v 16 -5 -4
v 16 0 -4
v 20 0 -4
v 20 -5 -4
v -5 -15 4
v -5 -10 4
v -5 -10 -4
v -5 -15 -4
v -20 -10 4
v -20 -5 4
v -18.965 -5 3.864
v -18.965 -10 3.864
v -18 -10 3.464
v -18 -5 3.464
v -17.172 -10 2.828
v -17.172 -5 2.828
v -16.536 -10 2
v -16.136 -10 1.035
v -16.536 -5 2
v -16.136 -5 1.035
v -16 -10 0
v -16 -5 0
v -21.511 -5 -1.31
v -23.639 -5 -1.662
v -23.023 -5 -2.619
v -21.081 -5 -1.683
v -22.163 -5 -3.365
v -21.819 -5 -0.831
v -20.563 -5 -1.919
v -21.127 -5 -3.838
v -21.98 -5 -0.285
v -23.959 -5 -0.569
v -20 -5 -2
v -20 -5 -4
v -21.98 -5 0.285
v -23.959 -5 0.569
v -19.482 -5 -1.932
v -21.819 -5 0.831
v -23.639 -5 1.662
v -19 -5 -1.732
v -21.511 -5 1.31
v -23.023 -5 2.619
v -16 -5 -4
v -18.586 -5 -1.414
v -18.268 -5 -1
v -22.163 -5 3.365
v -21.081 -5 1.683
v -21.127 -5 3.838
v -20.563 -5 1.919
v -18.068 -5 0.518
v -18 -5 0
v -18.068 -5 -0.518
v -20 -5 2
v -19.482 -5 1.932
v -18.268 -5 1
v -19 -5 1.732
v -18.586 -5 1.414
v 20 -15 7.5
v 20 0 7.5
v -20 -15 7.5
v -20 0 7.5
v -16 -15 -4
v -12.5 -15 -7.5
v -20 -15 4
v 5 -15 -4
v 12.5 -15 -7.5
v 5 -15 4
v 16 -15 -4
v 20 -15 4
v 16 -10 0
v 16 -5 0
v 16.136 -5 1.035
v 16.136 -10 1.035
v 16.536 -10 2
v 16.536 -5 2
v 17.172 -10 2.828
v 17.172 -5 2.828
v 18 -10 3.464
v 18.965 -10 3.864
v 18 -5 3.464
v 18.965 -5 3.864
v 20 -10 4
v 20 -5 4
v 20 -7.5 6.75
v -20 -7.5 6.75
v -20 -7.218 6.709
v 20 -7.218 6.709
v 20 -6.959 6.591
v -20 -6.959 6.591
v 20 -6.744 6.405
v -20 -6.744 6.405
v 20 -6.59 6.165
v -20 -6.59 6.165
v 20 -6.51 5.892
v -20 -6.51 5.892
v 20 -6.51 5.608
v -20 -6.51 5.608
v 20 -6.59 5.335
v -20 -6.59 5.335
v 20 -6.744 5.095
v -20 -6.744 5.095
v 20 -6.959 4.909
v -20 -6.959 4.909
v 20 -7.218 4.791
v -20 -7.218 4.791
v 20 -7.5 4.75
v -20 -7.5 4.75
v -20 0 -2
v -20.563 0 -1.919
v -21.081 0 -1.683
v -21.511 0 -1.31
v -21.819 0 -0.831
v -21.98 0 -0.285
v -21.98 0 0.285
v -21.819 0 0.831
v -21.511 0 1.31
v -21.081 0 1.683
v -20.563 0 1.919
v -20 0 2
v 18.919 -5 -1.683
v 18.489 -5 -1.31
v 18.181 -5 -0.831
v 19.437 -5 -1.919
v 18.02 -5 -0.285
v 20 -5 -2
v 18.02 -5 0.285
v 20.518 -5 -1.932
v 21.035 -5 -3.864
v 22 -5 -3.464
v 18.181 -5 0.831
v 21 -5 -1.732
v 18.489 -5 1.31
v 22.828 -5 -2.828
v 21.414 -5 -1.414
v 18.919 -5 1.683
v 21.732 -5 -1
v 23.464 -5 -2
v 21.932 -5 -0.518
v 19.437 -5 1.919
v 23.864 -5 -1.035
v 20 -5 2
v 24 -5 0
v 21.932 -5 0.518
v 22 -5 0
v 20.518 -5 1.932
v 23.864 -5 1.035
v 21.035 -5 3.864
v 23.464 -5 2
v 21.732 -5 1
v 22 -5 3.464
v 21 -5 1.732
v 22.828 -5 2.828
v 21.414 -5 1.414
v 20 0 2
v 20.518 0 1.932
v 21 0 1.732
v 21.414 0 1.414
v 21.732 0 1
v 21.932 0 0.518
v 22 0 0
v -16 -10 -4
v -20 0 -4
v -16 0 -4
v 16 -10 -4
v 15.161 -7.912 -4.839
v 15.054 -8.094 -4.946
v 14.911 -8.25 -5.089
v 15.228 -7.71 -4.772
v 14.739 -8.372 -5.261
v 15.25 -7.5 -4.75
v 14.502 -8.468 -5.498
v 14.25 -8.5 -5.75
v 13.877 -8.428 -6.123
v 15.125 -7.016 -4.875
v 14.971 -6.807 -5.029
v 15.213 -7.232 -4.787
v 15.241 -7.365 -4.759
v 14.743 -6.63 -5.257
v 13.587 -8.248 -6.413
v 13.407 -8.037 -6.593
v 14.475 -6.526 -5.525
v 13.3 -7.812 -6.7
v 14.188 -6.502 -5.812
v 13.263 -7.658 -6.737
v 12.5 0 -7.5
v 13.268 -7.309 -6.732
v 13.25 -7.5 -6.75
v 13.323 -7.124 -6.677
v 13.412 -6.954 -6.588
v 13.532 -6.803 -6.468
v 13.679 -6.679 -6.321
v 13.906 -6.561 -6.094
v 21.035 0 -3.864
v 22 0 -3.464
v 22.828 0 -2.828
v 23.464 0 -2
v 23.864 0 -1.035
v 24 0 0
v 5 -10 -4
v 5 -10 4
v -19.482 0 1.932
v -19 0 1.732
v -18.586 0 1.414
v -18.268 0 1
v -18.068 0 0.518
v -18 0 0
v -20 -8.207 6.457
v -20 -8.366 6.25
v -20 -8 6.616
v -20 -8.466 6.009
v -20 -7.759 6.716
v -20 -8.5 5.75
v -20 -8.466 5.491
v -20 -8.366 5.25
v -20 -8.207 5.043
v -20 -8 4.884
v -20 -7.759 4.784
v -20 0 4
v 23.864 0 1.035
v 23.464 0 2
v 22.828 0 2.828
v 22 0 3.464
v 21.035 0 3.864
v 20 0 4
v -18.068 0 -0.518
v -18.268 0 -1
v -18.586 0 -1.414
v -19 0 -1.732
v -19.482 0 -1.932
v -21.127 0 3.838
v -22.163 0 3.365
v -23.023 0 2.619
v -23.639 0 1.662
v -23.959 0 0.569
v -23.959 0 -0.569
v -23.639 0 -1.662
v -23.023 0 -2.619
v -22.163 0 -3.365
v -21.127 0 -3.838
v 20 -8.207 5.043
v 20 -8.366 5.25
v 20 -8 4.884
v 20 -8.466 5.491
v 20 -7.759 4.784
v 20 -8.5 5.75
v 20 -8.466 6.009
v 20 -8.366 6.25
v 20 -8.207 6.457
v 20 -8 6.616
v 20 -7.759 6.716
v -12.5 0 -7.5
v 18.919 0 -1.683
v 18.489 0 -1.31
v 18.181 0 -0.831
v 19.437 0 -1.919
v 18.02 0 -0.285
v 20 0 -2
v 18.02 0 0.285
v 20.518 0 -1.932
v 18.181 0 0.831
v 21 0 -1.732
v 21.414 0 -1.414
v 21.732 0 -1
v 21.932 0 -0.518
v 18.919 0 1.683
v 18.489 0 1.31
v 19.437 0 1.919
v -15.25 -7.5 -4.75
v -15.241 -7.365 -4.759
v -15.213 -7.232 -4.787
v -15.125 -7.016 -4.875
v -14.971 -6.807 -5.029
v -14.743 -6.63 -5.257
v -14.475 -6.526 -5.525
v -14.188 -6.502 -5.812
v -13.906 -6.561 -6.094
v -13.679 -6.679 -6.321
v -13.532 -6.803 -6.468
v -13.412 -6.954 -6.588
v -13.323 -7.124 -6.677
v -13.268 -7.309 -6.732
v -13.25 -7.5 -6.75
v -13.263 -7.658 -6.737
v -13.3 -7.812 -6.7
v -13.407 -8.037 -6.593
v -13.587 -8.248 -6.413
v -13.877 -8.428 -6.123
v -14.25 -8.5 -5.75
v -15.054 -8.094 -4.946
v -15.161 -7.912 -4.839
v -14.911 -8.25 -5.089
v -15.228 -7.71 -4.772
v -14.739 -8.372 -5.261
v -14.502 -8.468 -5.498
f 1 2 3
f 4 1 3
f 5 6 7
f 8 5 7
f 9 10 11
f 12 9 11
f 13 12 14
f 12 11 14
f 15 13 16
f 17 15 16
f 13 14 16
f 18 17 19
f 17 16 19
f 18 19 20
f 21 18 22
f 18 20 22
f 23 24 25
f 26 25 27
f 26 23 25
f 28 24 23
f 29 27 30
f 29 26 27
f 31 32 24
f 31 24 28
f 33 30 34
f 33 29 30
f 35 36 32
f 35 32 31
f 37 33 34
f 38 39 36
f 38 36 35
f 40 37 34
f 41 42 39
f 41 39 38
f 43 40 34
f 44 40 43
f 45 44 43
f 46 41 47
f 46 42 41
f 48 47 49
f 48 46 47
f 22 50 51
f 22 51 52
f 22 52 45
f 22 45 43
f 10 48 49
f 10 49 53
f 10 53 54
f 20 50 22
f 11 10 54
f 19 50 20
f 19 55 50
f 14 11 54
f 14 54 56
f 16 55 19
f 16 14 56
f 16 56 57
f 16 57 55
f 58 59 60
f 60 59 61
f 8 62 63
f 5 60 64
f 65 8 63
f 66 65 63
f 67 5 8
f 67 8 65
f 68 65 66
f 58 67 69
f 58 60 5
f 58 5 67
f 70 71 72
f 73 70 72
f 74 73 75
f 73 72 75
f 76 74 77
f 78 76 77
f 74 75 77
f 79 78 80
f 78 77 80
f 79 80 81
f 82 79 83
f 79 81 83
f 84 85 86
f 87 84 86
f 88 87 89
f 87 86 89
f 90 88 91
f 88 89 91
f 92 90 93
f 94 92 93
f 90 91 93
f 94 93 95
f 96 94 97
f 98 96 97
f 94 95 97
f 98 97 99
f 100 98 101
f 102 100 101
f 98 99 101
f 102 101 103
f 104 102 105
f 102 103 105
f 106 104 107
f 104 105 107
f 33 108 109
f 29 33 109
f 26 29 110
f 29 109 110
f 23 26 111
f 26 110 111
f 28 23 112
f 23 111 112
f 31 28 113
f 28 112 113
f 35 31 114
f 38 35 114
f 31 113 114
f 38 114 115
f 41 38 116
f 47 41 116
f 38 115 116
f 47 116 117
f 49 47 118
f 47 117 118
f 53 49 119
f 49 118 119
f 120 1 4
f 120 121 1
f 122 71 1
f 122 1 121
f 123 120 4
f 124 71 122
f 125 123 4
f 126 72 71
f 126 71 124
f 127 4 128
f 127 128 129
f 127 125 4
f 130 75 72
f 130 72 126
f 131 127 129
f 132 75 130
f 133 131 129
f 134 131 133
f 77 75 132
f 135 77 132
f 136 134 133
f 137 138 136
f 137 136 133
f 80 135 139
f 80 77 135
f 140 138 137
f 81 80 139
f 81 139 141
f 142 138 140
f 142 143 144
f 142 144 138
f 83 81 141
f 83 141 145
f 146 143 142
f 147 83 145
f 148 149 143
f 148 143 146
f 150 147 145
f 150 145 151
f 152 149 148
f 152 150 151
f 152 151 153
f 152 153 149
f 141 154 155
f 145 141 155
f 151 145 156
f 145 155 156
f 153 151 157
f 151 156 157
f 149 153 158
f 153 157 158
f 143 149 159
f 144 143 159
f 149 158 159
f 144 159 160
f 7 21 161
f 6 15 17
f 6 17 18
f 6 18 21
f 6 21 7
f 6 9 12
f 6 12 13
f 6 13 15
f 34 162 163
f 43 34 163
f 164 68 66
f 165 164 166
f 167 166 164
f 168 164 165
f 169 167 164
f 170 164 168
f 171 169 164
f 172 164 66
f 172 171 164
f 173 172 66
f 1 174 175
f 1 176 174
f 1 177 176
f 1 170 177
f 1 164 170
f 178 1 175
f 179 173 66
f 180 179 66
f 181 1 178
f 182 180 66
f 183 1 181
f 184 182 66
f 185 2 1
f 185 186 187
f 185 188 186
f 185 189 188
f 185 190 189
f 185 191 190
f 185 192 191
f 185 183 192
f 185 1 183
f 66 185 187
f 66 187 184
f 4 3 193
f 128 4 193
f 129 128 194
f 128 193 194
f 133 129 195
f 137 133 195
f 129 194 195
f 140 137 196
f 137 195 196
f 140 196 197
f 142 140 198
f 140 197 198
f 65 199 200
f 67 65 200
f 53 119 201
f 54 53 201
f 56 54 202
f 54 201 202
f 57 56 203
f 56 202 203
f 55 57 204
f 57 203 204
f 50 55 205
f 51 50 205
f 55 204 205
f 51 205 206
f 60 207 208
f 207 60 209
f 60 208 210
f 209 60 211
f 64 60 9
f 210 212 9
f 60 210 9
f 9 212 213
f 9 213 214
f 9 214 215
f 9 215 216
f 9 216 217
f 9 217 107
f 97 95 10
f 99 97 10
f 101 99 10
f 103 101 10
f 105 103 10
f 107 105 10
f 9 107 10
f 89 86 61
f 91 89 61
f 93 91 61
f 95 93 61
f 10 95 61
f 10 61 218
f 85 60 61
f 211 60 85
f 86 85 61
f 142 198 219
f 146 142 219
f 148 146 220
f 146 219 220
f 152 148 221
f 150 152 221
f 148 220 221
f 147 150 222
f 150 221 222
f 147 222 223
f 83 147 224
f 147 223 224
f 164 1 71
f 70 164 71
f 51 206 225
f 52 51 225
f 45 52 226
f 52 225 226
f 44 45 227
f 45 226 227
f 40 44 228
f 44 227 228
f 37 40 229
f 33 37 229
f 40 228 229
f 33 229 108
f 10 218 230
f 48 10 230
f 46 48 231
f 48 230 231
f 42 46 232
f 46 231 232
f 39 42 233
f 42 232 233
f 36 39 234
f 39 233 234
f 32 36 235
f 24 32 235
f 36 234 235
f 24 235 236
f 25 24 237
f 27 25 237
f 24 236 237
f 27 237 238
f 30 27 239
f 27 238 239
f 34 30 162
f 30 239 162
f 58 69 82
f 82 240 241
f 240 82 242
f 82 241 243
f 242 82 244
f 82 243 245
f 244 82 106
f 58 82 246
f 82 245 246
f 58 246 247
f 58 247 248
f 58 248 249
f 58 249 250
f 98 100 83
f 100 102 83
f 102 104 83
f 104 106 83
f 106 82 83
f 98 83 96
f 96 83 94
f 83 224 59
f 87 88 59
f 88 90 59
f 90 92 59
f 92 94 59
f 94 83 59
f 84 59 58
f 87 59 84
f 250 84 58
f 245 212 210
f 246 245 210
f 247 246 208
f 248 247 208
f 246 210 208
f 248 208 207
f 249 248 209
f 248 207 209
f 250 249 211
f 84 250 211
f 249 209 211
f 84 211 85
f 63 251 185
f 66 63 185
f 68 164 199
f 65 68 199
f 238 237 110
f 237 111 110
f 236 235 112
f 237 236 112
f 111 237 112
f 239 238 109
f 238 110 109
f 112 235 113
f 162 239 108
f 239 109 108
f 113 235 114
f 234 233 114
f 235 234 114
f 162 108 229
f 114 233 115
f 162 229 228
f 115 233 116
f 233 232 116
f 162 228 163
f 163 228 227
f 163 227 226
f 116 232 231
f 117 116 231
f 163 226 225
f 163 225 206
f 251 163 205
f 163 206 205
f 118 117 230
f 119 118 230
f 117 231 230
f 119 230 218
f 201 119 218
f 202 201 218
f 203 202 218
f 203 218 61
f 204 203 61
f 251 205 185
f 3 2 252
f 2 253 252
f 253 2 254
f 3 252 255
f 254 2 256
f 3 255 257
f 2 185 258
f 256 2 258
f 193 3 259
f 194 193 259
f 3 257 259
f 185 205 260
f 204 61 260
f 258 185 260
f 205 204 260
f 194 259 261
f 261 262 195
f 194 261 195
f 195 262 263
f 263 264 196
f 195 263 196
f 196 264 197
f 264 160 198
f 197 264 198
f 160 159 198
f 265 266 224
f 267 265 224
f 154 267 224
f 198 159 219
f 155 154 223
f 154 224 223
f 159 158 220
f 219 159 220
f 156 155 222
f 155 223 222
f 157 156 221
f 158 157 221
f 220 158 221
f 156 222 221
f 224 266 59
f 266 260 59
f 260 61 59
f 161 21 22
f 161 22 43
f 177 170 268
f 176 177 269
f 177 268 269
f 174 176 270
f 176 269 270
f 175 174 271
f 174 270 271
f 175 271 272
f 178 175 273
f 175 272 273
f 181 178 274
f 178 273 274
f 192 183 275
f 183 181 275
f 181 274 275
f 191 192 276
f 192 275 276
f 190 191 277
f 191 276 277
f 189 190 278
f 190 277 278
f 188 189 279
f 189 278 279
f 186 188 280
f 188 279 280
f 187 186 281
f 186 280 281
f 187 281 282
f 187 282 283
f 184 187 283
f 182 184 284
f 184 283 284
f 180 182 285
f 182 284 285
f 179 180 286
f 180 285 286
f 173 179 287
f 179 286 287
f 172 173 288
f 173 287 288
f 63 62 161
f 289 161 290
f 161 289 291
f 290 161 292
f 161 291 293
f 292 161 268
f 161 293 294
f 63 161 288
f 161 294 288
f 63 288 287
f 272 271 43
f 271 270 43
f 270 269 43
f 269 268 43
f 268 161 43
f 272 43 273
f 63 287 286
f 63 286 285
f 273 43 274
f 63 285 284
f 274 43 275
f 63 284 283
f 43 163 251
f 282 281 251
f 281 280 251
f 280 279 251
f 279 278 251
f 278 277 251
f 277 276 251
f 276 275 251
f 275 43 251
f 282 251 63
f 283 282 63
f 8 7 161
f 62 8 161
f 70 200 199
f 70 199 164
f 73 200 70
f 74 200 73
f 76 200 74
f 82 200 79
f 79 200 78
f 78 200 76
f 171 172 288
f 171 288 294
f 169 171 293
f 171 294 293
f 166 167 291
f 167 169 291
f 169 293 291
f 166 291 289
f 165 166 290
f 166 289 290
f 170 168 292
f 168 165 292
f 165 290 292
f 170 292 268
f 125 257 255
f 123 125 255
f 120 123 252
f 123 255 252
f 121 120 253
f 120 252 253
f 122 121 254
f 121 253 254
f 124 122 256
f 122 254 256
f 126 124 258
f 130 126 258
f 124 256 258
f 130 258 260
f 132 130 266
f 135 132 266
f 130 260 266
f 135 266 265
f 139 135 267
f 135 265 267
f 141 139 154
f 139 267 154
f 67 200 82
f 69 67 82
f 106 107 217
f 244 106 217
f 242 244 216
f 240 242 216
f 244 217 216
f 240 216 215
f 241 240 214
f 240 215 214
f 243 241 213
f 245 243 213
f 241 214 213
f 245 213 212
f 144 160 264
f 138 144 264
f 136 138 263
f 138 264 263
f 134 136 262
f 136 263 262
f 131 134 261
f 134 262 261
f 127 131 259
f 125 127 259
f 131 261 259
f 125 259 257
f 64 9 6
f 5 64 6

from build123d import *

# Parameters (mm, degrees)
F0_W        = 11
F0_H        = 4
F0_W_2      = 10
F1_DEPTH    = 10
F2_DEPTH    = 5
F3_DEPTH    = 15
F5_DEPTH    = 40
F6_T1_DEPTH = 33.0017809158


# Not quite as in the source:
# - a fillet or chamfer that OpenCascade refuses, or shapes differently, is made with other operations: its cross-section is extruded or revolved along the edge and cut away or added


with BuildPart() as f1:
    # F0 (on Front) → F1 (new body)
    with BuildSketch(Plane.XZ):
        Polygon((-5, 4), (5, 4), (20, 4), (20, 7.5), (-20, 7.5), (-20, 4), align=None)
        with BuildLine():
            Line((-5, 0), (-5, 4))
            Line((-5, 4), (-20, 4))
            ThreePointArc((-20, 4), (-17.1715728753, 2.8284271247), (-16, 0))
            Line((-16, 0), (-5, 0))
        make_face()
        with Locations((-10.5, -2)):
            Rectangle(F0_W, F0_H)
        Polygon((16, -4), (5, -4), (-5, -4), (-16, -4), (-16, -7.5), (16, -7.5), align=None)
        with Locations((0, -2)):
            Rectangle(F0_W_2, F0_H)
        with Locations((0, 2)):
            Rectangle(F0_W_2, F0_H)
        with BuildLine():
            Line((20, 4), (5, 4))
            Line((5, 4), (5, 0))
            Line((5, 0), (16, 0))
            ThreePointArc((16, 0), (17.1715728753, 2.8284271247), (20, 4))
        make_face()
        with Locations((10.5, -2)):
            Rectangle(F0_W, F0_H)
    extrude(amount=F1_DEPTH)

    # F0 (on Front) → F2 (join)
    with BuildSketch(Plane.XZ):
        with BuildLine():
            Line((-20, 2), (-20, 4))
            ThreePointArc((-20, 4), (-24, 0), (-20, -4))
            Line((-20, -4), (-20, -2))
            ThreePointArc((-20, -2), (-22, 0), (-20, 2))
        make_face()
        with BuildLine():
            ThreePointArc((-16, 0), (-17.1715728753, 2.8284271247), (-20, 4))
            Line((-20, 4), (-20, 2))
            ThreePointArc((-20, 2), (-18.5857864376, 1.4142135624), (-18, 0))
            ThreePointArc((-18, 0), (-18.5857864376, -1.4142135624), (-20, -2))
            Line((-20, -2), (-20, -4))
            ThreePointArc((-20, -4), (-17.1715728753, -2.8284271247), (-16, 0))
        make_face()
        with BuildLine():
            Line((-16, -4), (-16, 0))
            ThreePointArc((-16, 0), (-17.1715728753, -2.8284271247), (-20, -4))
            Line((-20, -4), (-16, -4))
        make_face()
        with BuildLine():
            ThreePointArc((20, -4), (17.1715728753, -2.8284271247), (16, 0))
            Line((16, 0), (16, -4))
            Line((16, -4), (20, -4))
        make_face()
        with BuildLine():
            Line((20, 2), (20, 4))
            ThreePointArc((20, 4), (17.1715728753, 2.8284271247), (16, 0))
            ThreePointArc((16, 0), (17.1715728753, -2.8284271247), (20, -4))
            Line((20, -4), (20, -2))
            ThreePointArc((20, -2), (18, 0), (20, 2))
        make_face()
        with BuildLine():
            ThreePointArc((24, 0), (22.8284271247, 2.8284271247), (20, 4))
            Line((20, 4), (20, 2))
            ThreePointArc((20, 2), (21.4142135624, 1.4142135624), (22, 0))
            ThreePointArc((22, 0), (21.4142135624, -1.4142135624), (20, -2))
            Line((20, -2), (20, -4))
            ThreePointArc((20, -4), (22.8284271247, -2.8284271247), (24, 0))
        make_face()
    extrude(amount=F2_DEPTH)

    # F0 (on Front) → F3 (join)
    with BuildSketch(Plane.XZ):
        Polygon((16, -4), (5, -4), (-5, -4), (-16, -4), (-16, -7.5), (16, -7.5), align=None)
        with Locations((0, -2)):
            Rectangle(F0_W_2, F0_H)
        with Locations((0, 2)):
            Rectangle(F0_W_2, F0_H)
        Polygon((-5, 4), (5, 4), (20, 4), (20, 7.5), (-20, 7.5), (-20, 4), align=None)
    extrude(amount=F3_DEPTH)

    # F4 (on face) → F5 (cut)
    with BuildSketch(Plane(origin=(-20, 0, 0), x_dir=(0, -1, 0), z_dir=(-1, 0, 0))):
        with BuildLine():
            ThreePointArc((8.5, -5.75), (8.2071067812, -5.0428932188), (7.5, -4.75))
            Line((7.5, -4.75), (7.5, -6.75))
            ThreePointArc((7.5, -6.75), (8.2071067812, -6.4571067812), (8.5, -5.75))
        make_face()
        with BuildLine():
            Line((7.5, -6.75), (7.5, -4.75))
            ThreePointArc((7.5, -4.75), (6.5, -5.75), (7.5, -6.75))
        make_face()
        with BuildLine():
            ThreePointArc((7.5, 6.75), (6.5, 5.75), (7.5, 4.75))
            Line((7.5, 4.75), (7.5, 6.75))
        make_face()
        with BuildLine():
            Line((7.5, 6.75), (7.5, 4.75))
            ThreePointArc((7.5, 4.75), (8.2071067812, 5.0428932188), (8.5, 5.75))
            ThreePointArc((8.5, 5.75), (8.2071067812, 6.4571067812), (7.5, 6.75))
        make_face()
    extrude(amount=-F5_DEPTH, mode=Mode.SUBTRACT)

    # F6: chamfer of 3.5 on 2 edges, made by hand

    # F6_s2 → F6_t1 (cut)
    with BuildSketch(Plane.XZ.offset(-9.0008904579)):
        Polygon((-16, -4), (-12.5, -7.5), (-16, -7.5), align=None)
        Polygon((16, -4), (12.5, -7.5), (16, -7.5), align=None)
    extrude(amount=F6_T1_DEPTH, mode=Mode.SUBTRACT)


solid = f1.part
